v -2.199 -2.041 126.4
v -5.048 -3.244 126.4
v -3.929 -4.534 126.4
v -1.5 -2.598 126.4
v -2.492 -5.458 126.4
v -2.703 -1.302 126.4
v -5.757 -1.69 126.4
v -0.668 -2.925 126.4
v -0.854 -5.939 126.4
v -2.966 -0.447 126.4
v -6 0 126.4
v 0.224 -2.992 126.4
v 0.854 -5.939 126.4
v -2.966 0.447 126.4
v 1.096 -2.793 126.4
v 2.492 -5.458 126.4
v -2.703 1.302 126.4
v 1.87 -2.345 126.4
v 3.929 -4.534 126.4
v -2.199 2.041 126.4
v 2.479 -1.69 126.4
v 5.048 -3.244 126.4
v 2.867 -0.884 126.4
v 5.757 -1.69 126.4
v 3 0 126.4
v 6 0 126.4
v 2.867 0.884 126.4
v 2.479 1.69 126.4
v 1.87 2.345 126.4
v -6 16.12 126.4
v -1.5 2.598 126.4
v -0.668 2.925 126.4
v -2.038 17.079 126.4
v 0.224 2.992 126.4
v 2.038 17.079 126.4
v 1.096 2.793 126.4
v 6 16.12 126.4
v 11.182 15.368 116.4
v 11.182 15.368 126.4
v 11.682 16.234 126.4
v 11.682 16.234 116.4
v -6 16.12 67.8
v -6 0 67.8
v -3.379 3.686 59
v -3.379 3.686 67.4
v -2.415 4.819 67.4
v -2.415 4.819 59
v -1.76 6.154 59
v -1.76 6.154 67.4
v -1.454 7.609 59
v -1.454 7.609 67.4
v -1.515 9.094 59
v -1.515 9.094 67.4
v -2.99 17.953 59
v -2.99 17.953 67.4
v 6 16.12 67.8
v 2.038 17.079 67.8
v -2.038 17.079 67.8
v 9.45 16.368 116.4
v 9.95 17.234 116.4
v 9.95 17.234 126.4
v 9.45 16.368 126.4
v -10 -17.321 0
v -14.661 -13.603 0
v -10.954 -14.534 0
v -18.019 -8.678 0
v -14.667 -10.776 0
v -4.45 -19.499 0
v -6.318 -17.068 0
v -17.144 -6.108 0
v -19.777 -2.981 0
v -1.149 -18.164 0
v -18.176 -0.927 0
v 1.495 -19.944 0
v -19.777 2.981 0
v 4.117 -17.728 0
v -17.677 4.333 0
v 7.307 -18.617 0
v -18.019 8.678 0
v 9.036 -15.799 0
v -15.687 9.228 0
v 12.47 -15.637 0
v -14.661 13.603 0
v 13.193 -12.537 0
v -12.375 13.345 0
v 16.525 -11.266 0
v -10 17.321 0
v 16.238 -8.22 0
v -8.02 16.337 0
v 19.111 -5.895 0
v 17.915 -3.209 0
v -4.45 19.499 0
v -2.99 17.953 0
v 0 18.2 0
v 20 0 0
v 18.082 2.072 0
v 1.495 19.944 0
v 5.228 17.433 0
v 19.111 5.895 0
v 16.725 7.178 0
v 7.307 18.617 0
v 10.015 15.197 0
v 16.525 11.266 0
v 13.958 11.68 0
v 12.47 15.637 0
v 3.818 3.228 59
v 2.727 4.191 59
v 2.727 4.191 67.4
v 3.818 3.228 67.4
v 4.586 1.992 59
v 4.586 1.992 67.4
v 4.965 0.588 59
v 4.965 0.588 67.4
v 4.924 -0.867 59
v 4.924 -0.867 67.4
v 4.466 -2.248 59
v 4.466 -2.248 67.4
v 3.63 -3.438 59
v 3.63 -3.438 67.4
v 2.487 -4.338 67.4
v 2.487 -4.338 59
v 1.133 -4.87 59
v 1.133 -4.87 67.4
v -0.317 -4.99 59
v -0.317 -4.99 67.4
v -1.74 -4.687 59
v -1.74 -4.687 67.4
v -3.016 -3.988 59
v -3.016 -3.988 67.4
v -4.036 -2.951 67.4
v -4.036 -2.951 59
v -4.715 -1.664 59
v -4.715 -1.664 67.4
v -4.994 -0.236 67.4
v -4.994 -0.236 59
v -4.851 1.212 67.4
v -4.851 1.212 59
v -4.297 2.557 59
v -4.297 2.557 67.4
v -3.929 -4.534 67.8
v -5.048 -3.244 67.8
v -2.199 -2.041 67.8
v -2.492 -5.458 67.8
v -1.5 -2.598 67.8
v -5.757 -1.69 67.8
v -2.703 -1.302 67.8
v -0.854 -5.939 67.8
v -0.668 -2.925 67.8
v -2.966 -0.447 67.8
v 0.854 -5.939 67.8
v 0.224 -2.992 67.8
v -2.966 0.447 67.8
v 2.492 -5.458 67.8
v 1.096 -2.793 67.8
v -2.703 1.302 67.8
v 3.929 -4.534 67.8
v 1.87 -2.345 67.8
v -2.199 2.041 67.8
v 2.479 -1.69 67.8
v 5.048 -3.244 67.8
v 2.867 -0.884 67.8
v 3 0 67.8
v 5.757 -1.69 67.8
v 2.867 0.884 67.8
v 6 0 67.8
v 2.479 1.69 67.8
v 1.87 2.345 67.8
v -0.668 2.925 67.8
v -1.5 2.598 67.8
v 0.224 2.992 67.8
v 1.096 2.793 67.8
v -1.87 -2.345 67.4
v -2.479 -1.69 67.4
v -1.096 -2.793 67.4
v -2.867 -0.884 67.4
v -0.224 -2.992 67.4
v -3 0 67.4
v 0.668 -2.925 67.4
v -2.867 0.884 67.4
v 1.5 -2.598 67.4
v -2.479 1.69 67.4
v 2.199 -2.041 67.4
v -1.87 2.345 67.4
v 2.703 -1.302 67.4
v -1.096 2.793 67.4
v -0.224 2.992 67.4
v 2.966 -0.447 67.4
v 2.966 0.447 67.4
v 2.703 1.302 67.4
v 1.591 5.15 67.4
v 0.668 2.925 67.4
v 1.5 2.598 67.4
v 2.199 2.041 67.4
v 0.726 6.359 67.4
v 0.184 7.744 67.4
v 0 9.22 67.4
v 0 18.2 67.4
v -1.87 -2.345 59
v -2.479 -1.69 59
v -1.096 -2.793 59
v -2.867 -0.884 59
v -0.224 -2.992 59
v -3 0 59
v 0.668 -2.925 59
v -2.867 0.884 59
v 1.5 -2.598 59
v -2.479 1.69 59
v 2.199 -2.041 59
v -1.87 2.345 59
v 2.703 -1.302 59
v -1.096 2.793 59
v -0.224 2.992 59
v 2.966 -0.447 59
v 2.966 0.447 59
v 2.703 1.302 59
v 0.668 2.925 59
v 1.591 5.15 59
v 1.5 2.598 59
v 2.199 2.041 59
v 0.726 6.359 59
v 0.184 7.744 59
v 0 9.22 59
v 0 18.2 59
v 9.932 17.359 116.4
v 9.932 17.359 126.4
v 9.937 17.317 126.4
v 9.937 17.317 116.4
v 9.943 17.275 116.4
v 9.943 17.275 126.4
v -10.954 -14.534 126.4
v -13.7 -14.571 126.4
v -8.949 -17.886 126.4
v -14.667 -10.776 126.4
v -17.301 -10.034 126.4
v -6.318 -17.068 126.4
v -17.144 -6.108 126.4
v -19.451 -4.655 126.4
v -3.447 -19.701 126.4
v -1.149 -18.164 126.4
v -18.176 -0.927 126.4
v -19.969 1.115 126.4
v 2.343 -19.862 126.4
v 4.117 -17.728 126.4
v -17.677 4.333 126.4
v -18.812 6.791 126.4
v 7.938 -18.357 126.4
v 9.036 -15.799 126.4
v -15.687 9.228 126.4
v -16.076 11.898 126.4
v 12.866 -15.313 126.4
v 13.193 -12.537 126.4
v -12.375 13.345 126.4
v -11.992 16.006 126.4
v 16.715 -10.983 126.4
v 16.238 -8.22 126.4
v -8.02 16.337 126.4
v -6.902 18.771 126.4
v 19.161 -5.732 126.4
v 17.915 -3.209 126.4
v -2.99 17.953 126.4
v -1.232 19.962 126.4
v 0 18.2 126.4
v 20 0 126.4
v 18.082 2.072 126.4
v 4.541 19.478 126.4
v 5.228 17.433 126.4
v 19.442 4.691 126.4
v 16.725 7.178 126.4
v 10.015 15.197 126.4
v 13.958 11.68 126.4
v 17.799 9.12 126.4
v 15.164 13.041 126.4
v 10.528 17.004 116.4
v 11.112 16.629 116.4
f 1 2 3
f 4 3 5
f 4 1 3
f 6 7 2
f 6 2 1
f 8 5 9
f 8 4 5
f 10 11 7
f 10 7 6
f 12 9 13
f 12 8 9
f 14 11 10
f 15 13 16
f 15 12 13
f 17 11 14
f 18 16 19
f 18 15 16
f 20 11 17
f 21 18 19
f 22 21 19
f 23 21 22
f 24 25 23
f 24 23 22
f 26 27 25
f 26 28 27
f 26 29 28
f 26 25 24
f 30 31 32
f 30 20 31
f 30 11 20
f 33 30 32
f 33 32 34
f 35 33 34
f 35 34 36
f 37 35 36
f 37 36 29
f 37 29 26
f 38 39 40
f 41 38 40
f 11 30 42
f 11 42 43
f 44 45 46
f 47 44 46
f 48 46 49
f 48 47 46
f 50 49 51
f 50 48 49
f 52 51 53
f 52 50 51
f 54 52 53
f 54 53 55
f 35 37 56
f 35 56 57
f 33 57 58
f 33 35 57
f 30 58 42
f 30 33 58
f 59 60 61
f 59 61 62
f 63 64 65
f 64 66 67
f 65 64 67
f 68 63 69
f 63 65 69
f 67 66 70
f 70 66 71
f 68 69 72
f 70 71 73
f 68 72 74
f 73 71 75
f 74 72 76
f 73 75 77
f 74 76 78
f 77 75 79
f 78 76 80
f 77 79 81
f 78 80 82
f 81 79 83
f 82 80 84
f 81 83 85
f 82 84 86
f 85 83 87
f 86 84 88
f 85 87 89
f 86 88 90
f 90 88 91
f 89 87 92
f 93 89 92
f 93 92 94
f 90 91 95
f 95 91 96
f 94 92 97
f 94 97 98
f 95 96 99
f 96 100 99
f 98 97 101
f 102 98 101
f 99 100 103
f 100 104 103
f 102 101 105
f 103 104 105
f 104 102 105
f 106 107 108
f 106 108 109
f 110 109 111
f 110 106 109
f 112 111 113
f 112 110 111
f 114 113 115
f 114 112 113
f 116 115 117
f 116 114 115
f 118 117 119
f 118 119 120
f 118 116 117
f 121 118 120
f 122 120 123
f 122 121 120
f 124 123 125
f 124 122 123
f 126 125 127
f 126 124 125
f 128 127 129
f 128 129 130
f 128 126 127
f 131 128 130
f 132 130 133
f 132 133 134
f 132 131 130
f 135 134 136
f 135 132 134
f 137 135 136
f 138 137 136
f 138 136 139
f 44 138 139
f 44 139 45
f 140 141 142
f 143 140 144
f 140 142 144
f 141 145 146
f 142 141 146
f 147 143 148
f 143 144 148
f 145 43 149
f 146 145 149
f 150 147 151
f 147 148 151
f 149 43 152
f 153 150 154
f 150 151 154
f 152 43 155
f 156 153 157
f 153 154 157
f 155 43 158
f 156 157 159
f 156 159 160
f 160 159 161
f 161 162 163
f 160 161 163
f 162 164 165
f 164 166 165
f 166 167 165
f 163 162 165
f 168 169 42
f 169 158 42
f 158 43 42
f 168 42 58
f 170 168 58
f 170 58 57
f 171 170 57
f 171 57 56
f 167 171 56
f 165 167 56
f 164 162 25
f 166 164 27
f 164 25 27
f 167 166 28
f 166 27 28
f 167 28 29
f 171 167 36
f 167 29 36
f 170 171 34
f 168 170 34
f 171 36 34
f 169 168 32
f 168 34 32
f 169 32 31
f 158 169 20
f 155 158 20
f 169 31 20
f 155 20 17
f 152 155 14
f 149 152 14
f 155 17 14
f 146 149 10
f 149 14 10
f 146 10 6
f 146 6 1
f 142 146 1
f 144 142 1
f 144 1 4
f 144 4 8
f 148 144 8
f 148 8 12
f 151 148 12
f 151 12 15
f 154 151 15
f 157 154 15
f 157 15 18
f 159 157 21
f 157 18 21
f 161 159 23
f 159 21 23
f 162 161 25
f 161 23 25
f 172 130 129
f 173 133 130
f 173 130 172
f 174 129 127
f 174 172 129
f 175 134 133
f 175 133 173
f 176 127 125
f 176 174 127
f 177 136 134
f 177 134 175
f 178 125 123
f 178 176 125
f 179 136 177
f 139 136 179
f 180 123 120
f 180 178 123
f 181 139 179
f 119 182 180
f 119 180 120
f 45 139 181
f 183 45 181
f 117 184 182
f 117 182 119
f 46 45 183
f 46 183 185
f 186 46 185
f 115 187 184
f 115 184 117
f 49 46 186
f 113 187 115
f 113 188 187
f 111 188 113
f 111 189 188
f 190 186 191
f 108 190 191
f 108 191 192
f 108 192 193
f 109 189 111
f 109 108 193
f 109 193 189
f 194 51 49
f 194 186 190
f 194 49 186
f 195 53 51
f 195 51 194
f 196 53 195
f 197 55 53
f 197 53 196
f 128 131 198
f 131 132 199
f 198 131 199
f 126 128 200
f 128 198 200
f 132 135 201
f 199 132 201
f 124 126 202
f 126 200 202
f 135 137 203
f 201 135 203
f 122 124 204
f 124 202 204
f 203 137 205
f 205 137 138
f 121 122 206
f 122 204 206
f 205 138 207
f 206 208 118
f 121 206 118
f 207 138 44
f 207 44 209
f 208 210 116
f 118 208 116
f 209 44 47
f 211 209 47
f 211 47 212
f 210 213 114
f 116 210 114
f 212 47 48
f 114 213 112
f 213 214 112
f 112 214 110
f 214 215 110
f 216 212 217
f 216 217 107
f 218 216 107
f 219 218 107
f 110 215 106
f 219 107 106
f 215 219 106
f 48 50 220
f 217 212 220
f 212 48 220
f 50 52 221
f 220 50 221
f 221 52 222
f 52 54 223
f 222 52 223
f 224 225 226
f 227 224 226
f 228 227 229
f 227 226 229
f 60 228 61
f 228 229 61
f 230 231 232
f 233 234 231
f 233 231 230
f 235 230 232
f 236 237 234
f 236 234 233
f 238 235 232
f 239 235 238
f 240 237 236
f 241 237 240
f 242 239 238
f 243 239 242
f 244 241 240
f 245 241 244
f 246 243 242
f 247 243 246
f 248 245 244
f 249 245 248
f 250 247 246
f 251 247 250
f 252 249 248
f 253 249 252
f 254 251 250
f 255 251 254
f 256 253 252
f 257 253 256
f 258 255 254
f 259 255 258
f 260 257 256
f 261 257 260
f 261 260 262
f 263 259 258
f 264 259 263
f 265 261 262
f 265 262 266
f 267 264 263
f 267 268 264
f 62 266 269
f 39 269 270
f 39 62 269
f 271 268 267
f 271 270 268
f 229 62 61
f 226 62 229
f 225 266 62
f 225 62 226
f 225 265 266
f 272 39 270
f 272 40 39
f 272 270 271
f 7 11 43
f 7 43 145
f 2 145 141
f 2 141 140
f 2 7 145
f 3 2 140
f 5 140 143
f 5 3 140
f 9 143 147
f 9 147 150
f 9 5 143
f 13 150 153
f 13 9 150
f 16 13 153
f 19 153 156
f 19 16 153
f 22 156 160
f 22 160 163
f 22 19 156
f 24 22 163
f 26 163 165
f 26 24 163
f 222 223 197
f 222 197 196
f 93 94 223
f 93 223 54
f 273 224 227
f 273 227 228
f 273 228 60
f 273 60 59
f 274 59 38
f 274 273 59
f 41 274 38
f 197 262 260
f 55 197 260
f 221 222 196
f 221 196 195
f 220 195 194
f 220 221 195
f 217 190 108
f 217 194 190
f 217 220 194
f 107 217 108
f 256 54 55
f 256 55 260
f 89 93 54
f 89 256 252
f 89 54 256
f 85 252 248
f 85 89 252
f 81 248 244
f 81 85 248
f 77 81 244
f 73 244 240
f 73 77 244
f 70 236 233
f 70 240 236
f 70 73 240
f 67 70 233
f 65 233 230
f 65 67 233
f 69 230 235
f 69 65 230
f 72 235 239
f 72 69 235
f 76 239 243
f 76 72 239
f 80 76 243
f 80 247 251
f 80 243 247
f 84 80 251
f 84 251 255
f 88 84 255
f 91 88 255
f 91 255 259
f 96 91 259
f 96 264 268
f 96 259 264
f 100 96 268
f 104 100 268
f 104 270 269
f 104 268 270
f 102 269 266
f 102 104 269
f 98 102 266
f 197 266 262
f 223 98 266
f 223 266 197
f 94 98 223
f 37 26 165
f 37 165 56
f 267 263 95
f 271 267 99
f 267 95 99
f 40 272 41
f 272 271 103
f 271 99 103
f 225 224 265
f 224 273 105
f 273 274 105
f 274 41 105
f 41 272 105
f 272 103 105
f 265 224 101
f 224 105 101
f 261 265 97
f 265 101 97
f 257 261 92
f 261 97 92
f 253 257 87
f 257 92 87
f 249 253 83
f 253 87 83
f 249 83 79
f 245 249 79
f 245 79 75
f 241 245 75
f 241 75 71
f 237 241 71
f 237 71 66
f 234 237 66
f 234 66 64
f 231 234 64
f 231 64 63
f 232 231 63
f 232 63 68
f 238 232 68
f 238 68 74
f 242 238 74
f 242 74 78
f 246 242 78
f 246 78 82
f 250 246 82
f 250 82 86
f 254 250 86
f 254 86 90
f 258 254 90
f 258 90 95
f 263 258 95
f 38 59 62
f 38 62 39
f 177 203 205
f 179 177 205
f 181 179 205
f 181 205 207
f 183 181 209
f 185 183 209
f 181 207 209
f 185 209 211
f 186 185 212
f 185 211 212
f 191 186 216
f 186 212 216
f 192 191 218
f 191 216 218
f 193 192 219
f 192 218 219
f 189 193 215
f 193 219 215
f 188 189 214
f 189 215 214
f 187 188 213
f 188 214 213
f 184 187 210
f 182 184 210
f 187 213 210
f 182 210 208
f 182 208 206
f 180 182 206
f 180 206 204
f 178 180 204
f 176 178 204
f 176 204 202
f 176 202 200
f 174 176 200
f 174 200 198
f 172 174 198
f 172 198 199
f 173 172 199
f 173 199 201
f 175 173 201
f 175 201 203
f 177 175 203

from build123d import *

# Parameters (mm, degrees)
SKETCH_2_R          = 20
SKETCH_2_R_2        = 18.2
EXTRUDE_1_DEPTH     = 126.4
SKETCH_5_R          = 3
EXTRUDE_3_DEPTH     = 126.4
CUT_EXTRUDE1_DEPTH  = 59
CUT_EXTRUDE2_DEPTH  = 59
SKETCH3_R           = 3
BOSS_EXTRUDE1_DEPTH = 58.6
CUT_EXTRUDE3_DEPTH  = 10


with BuildPart() as part:
    # Эскиз2 → Бобышка-Вытянуть1 (new body)
    with BuildSketch(Plane.XY):
        Circle(SKETCH_2_R)
        Circle(SKETCH_2_R_2, mode=Mode.SUBTRACT)
    extrude(amount=EXTRUDE_1_DEPTH)

    # Эскиз5 → Бобышка-Вытянуть3 (add, through all)
    with BuildSketch(Plane(origin=(0, 0, 0), x_dir=(-1, 0, 0), z_dir=(0, 0, -1))):
        with BuildLine():
            Line((0, 18.2), (0, 9.219544457))
            ThreePointArc((0, 9.219544457), (-0.725705562, 6.35915669), (-2.727272727, 4.190702026))
            ThreePointArc((-2.727272727, 4.190702026), (-0.412087912, -4.982989419), (3.378646828, 3.685748989))
            ThreePointArc((3.378646828, 3.685748989), (1.760493123, 6.153550709), (1.514534917, 9.094294034))
            Line((1.514534917, 9.094294034), (2.989793652, 17.952747253))
            ThreePointArc((2.989793652, 17.952747253), (1.5, 18.138081486), (0, 18.2))
        make_face()
        Circle(SKETCH_5_R, mode=Mode.SUBTRACT)
    extrude(amount=-EXTRUDE_3_DEPTH)

    # Sketch1 → Cut-Extrude1 (cut)
    with BuildSketch(Plane(origin=(0, 0, 0), x_dir=(-1, 0, 0), z_dir=(0, 0, -1))):
        with BuildLine():
            Line((0, 18.2), (2.989793652, 17.952747253))
            ThreePointArc((2.989793652, 17.952747253), (-1.5, -18.138081486), (0, 18.2))
        make_face()
    extrude(amount=-CUT_EXTRUDE1_DEPTH, mode=Mode.SUBTRACT)

    # Sketch2 → Cut-Extrude2 (cut)
    with BuildSketch(Plane.XY.offset(126.4)):
        with BuildLine():
            Line((0, 18.2), (-2.989793652, 17.952747253))
            ThreePointArc((-2.989793652, 17.952747253), (1.5, -18.138081486), (0, 18.2))
        make_face()
    extrude(amount=-CUT_EXTRUDE2_DEPTH, mode=Mode.SUBTRACT)

    # Sketch4 → Cut-Extrude3 (cut)
    with BuildSketch(Plane.XY.offset(126.4)):
        with BuildLine():
            Line((9.949874371, 17.23368794), (9.449874371, 16.367662536))
            Line((9.449874371, 16.367662536), (11.181925179, 15.367662536))
            Line((11.181925179, 15.367662536), (11.681925179, 16.23368794))
            ThreePointArc((11.681925179, 16.23368794), (11.905777201, 18.621411015), (9.949874371, 17.23368794))
        make_face()
    extrude(amount=-CUT_EXTRUDE3_DEPTH, mode=Mode.SUBTRACT)


with BuildPart() as body_2:
    # Sketch3 → Boss-Extrude1 (new body)
    with BuildSketch(Plane.XY.offset(126.4)):
        with BuildLine():
            Line((6, 0), (6, 16.119553344))
            ThreePointArc((6, 16.119553344), (0, 17.2), (-6, 16.119553344))
            Line((-6, 16.119553344), (-6, 0))
            ThreePointArc((-6, 0), (0, -6), (6, 0))
        make_face()
        Circle(SKETCH3_R, mode=Mode.SUBTRACT)
    extrude(amount=-BOSS_EXTRUDE1_DEPTH)


solid = Compound([part.part, body_2.part])
